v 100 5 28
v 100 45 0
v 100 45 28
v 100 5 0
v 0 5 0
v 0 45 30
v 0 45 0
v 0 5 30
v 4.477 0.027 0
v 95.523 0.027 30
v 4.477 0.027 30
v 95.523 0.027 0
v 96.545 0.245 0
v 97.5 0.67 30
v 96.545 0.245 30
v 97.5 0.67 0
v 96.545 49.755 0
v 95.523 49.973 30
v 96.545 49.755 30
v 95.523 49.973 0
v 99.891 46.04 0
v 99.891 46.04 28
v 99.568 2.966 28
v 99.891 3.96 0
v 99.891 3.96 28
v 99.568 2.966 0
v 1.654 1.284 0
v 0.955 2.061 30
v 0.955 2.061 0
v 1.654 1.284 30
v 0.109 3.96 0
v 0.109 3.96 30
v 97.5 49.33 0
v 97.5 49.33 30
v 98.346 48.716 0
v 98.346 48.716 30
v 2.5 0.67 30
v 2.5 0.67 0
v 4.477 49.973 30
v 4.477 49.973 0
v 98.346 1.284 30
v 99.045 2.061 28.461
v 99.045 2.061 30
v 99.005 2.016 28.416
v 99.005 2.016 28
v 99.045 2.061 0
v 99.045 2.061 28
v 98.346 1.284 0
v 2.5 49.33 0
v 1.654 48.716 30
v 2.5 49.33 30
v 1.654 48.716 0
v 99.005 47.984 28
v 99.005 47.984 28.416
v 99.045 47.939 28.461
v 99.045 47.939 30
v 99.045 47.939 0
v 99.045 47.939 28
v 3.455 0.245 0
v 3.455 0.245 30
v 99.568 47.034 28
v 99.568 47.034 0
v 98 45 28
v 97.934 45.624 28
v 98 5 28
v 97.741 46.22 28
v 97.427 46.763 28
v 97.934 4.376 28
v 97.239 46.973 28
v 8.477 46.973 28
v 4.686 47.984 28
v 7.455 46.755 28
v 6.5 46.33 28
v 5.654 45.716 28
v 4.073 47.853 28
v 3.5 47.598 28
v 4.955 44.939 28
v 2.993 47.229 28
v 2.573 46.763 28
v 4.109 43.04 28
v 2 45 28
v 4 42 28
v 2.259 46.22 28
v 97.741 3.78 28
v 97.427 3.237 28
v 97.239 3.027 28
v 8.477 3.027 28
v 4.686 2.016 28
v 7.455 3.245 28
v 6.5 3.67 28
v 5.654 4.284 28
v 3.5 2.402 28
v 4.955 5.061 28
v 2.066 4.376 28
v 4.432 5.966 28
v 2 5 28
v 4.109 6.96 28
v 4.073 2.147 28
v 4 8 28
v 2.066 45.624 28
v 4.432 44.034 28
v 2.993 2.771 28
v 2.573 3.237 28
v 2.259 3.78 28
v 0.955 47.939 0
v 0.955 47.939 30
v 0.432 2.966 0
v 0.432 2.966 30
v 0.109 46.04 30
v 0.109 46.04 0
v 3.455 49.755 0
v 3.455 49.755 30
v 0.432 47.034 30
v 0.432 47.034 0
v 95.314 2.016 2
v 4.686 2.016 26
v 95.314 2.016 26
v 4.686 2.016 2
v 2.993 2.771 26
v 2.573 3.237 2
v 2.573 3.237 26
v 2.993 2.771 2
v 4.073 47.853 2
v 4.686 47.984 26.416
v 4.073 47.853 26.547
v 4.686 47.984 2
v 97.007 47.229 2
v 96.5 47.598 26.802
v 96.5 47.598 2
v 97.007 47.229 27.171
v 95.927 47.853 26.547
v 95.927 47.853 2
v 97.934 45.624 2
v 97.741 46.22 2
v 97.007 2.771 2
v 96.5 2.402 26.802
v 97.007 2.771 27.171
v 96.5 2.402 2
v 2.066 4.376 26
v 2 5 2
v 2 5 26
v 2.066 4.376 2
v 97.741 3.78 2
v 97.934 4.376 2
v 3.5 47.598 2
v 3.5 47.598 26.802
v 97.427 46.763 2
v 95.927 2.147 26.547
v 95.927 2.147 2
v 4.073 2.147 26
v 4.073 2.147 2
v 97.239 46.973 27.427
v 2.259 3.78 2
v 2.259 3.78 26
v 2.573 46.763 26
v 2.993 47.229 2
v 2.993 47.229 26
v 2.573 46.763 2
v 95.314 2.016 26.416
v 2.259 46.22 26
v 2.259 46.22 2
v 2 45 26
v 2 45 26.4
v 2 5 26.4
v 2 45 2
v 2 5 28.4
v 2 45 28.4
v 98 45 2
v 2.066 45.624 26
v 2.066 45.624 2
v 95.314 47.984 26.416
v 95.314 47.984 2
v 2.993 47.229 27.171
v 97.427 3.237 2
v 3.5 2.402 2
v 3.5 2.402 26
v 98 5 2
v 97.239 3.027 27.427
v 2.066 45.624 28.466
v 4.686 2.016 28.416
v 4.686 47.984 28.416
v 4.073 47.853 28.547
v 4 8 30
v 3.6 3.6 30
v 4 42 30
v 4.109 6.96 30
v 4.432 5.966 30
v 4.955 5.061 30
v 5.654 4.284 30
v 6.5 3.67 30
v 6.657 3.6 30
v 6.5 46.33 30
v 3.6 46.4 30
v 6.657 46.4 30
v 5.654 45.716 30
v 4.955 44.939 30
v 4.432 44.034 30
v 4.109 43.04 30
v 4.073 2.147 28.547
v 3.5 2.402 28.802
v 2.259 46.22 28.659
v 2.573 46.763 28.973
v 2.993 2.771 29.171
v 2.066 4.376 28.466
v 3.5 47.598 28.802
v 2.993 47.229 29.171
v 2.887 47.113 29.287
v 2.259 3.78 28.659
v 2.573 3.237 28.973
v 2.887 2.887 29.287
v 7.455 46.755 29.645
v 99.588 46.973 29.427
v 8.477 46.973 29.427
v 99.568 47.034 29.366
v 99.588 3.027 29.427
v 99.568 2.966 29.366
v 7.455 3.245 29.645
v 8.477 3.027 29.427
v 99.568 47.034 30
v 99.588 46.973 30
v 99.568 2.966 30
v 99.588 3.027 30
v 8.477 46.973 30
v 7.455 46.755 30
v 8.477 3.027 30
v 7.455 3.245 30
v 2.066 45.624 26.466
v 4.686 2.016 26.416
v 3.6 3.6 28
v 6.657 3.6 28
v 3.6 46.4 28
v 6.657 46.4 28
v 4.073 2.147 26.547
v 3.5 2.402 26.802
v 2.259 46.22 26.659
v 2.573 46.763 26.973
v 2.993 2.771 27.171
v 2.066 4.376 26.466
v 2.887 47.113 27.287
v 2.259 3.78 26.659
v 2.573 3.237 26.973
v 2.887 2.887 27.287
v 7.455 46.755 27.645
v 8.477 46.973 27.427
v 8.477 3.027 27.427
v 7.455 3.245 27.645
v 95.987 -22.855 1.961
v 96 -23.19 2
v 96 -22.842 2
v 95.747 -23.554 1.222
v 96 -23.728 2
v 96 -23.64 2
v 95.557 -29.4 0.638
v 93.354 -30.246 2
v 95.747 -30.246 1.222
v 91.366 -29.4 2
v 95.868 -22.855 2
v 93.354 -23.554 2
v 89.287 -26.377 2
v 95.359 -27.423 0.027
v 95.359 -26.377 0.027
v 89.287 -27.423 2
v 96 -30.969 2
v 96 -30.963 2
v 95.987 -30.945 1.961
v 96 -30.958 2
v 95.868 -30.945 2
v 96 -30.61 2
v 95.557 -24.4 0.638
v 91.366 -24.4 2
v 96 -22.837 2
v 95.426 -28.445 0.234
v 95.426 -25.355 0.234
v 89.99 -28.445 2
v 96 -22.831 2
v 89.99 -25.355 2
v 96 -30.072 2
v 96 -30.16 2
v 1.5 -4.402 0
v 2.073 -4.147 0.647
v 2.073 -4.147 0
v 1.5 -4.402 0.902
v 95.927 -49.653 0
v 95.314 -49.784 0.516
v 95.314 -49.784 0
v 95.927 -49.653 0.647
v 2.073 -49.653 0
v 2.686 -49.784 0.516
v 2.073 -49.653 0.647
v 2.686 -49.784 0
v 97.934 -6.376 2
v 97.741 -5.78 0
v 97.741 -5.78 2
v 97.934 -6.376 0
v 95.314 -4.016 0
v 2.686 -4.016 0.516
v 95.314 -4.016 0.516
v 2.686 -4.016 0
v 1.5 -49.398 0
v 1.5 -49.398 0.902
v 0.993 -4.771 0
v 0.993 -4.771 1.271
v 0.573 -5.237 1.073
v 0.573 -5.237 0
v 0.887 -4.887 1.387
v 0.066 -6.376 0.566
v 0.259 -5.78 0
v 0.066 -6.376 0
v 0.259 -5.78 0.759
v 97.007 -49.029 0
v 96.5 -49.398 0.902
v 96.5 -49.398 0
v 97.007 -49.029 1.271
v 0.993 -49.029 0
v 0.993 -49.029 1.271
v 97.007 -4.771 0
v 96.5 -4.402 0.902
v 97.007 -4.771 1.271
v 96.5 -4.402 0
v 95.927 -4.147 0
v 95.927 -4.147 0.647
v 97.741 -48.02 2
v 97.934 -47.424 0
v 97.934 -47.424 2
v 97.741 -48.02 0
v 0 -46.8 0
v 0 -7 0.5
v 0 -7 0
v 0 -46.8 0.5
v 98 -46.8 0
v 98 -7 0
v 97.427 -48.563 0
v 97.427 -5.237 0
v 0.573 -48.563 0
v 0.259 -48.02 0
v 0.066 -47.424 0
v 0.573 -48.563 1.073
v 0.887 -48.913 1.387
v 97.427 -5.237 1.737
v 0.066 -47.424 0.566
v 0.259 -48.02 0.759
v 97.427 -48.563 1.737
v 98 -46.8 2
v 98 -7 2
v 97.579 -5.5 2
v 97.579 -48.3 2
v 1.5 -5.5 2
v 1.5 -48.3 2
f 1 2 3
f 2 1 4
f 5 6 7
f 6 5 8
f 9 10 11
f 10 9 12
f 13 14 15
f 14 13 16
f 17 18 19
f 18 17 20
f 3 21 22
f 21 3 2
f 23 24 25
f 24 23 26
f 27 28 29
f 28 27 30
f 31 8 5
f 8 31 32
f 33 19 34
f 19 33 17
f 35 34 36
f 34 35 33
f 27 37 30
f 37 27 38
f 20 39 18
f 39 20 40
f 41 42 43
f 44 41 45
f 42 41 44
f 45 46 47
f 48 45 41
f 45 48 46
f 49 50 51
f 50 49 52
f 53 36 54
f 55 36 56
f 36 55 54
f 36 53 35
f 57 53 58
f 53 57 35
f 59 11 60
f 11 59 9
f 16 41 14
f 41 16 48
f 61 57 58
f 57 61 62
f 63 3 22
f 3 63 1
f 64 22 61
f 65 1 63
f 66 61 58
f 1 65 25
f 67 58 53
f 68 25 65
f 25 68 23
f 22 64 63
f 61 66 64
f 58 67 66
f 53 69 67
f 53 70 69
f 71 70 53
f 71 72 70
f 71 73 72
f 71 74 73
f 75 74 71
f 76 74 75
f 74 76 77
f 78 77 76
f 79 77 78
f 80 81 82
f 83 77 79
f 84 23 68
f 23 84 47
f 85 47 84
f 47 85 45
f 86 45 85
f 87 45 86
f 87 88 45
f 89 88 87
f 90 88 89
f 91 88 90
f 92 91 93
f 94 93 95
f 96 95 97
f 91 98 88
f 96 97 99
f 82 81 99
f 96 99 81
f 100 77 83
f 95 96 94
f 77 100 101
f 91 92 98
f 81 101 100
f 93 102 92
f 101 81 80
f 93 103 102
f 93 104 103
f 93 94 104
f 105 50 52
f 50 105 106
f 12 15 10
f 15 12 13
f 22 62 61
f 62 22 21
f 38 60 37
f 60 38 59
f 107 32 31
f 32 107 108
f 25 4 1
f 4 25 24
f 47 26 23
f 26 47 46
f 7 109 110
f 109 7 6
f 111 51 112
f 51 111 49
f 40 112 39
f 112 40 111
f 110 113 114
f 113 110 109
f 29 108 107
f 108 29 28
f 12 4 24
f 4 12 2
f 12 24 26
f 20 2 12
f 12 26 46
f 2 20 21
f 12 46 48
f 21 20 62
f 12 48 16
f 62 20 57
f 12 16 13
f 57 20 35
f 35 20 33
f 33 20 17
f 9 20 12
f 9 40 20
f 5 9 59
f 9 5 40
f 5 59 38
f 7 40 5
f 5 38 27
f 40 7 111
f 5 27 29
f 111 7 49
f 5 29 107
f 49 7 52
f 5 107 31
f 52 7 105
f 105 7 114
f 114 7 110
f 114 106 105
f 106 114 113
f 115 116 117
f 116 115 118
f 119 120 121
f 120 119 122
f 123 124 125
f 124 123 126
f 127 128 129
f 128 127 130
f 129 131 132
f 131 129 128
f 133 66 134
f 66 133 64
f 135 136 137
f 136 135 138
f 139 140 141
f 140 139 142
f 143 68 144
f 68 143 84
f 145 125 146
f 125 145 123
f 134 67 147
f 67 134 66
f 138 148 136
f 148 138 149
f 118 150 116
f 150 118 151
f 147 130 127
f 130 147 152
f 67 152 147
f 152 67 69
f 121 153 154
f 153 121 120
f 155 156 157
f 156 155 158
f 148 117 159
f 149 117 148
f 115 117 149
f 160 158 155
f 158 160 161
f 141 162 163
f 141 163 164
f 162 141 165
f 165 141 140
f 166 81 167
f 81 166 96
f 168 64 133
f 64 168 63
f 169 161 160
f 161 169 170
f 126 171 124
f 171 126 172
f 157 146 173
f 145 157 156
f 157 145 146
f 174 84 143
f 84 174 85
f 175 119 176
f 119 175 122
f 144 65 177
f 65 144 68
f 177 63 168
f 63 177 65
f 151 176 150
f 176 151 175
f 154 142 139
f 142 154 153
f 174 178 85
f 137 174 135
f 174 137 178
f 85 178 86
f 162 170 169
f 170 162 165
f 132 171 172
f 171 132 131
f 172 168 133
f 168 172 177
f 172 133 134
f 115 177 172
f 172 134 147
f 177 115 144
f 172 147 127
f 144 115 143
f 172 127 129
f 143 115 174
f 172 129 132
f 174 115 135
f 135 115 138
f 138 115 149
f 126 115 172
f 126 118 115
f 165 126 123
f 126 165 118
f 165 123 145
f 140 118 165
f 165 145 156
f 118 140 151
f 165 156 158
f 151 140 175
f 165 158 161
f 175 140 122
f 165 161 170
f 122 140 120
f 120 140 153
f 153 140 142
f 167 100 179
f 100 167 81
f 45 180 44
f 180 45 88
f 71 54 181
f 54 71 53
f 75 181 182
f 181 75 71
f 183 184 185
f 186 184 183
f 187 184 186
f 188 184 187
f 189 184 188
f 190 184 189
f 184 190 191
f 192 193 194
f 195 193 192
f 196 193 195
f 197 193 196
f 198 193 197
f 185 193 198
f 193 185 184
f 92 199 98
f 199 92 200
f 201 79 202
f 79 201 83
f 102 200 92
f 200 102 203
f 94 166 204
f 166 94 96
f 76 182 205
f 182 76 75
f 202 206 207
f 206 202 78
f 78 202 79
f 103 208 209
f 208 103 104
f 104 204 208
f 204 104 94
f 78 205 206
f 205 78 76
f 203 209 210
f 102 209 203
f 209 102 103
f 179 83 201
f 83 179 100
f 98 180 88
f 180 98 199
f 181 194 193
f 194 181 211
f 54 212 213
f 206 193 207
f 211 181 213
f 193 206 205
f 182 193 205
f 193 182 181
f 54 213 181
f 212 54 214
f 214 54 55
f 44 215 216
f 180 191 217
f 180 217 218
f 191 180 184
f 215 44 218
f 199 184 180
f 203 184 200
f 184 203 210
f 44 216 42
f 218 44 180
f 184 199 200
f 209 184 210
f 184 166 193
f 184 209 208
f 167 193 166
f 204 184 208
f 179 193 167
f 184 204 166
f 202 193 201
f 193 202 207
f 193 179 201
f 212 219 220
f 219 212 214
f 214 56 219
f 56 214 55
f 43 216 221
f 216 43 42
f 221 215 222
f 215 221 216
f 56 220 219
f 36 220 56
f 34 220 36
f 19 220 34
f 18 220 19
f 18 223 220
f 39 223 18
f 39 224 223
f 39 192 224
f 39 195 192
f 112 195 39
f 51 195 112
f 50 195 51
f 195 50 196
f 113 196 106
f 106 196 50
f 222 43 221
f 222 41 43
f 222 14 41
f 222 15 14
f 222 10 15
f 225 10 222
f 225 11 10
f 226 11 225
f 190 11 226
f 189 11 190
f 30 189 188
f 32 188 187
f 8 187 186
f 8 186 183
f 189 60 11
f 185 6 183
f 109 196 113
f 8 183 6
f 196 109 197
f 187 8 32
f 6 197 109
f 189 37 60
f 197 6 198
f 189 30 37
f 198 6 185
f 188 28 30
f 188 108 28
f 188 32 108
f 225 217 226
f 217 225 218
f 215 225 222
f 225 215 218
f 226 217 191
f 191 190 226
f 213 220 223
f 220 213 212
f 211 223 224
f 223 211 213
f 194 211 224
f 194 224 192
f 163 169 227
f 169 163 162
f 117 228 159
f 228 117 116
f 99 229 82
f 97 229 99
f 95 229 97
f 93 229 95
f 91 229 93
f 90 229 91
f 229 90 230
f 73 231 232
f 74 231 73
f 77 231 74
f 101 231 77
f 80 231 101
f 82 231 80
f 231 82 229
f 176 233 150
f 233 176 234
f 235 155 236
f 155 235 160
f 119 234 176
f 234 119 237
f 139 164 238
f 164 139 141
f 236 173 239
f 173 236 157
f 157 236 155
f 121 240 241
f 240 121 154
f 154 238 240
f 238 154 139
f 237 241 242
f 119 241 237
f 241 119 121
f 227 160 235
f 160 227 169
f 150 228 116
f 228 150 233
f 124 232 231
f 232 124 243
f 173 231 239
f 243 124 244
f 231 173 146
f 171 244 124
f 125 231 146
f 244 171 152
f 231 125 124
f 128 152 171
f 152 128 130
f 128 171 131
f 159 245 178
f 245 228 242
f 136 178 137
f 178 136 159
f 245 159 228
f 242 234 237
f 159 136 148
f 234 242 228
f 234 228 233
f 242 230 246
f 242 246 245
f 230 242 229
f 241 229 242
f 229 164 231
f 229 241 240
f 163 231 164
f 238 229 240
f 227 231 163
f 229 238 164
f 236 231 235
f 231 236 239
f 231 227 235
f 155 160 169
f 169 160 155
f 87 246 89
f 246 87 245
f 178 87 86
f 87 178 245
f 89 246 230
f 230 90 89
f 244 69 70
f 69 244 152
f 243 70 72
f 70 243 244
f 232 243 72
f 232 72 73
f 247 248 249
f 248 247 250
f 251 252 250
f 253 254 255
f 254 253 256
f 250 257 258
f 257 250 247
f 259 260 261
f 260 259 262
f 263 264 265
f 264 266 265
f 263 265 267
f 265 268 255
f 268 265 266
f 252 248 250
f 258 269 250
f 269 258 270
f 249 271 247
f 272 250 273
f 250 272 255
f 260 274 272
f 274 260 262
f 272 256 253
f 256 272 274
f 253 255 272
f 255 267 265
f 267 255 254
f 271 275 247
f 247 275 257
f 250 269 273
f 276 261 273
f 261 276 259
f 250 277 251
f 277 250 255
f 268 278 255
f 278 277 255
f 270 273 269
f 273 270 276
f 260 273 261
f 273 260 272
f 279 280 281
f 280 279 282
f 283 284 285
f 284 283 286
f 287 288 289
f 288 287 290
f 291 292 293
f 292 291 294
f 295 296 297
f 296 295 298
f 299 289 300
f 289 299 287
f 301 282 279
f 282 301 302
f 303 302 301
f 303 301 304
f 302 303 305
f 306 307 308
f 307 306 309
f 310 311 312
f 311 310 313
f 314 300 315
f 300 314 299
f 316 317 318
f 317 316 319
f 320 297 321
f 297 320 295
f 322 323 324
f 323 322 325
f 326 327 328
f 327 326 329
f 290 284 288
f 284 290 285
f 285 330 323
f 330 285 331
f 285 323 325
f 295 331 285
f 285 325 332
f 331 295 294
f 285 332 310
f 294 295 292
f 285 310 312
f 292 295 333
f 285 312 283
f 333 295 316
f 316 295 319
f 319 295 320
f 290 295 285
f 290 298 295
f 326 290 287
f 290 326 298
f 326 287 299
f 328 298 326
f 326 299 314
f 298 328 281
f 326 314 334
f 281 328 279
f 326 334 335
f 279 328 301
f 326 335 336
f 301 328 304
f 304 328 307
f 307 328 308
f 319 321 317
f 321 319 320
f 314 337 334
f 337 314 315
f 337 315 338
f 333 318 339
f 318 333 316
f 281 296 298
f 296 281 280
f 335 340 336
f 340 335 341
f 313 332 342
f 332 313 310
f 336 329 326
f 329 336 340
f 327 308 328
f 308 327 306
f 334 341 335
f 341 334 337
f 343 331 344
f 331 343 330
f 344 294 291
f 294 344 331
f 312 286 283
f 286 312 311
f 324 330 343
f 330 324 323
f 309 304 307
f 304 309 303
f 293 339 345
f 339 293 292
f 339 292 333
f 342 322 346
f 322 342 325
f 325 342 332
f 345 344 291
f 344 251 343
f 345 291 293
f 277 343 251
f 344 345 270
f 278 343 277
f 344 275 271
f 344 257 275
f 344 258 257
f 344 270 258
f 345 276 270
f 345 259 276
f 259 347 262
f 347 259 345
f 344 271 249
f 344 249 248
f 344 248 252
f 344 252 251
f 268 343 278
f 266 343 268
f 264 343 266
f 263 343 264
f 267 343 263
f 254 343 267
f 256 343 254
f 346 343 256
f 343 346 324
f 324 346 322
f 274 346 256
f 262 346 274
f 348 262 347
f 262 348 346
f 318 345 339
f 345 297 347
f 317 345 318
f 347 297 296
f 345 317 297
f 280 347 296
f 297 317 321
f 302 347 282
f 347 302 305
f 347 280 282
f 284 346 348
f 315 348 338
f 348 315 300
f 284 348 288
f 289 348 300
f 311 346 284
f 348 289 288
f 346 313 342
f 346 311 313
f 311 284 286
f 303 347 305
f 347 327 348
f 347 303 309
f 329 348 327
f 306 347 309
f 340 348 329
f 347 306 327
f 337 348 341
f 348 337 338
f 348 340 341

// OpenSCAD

itemsShown="both"; // [both,box,lid]
boxLength=100;
boxWidth=50;
boxHeight=30;
cornerRadius=5;
wallThickness=2;
bottomThickness=2;
lidThickness=2;
lidClearance=0.2;
lidEdgeThickness=0.5;
// Notch in the lid
withNotch=true;//true;//[true:false]

/* [Global] */
if (itemsShown=="box") showBox();
if (itemsShown=="lid") showLid();
if (itemsShown=="both"){showBox();showLid();}

module showLid(){
	translate ([0, -2*wallThickness, 0]) 
	roundBoxLid(l=boxLength-wallThickness,
				w=boxWidth-2*wallThickness-lidClearance,
				h=lidThickness,
				et=lidEdgeThickness,
				r=cornerRadius-wallThickness,
				notch=withNotch);
}

module showBox(){
	round_box(l=boxLength,
			  w=boxWidth,
			  h=boxHeight,
			  bt=bottomThickness,
			  wt=wallThickness,
			  lt=lidThickness,
			  r=cornerRadius);
}

module round_box(l=40,w=30,h=30,bt=2,wt=2,lt=2,r=5,){
	difference() { 
		round_cube(l=l,w=w,h=h-lt,r=r);
		translate ([wt, wt, bt]) 
		round_cube(l=l-wt*2,w=w-wt*2,h=h,r=r-wt);
	}
	//use two box rims. one to make a slope to support the lid
	roundBoxRim();
	translate ([0, 0, -wt]) roundBoxRim();
}

module roundBoxRim(l=boxLength,
				   w=boxWidth,
				   h=boxHeight,
				   et=lidEdgeThickness,
				   r=cornerRadius,
				   wt=wallThickness,
				   lt=lidThickness){
	difference() { 
		translate ([0, 0, h-lt]) 
		round_cube(l=l,w=w,h=lt,r=r);
		translate ([wt+lt,wt+lt-et*2,h-lt-0.1]) 
		round_cube(l=l*2,w=w-2*(wt+lt)+4*et,h=lt+0.2,r=r-wt+lt);

		//subtract out a lid to make the ledge
		translate ([wt, w-wt, h-lt-0.1])
		roundBoxLid(l=l*2,w=w-2*wt,h=lt+0.1,wt=wt,t=lt,et=0.5,r=r-wt,notch=false);
	}
}

module roundBoxLid(l=40,w=30,h=3,wt=2,t=2,et=0.5,r=5,notch=true){
	translate ([l, 0, 0]) 
	rotate (a = [0, 0, 180]) 
	difference(){
		round_cube(l=l,w=w,h=h,t=t,r=r);

		translate ([-1, 0, et]) rotate (a = [45, 0, 0])  cube (size = [l+2, h*2, h*2]); 
		translate ([-1, w, et]) rotate (a = [45, 0, 0])  cube (size = [l+2, h*2, h*2]); 
		translate ([l, -1, et]) rotate (a = [45, 0, 90]) cube (size = [w+2, h*2, h*2]); 
		if (notch==true){
			translate([2,w/2,h+0.001]) thumbNotch(10/2,72,t);
		}
	}
}

module thumbNotch(
	thumbR=12/2,
	angle=72,
	notchHeight=2){

	size=10*thumbR;

	rotate([0,0,90])
	difference(){
		translate([0,
					(thumbR*sin(angle)-notchHeight)/tan(angle),
					 thumbR*sin(angle)-notchHeight])
		rotate([angle,0,0])
		cylinder(r=thumbR,h=size,$fn=30);

		translate([-size,-size,0])
		cube(size*2);
	}
}

module round_cube(l=40,w=30,h=20,r=5,$fn=30){
	hull(){ 
		translate ([r, r, 0]) cylinder (h = h, r=r);
		translate ([r, w-r, 0]) cylinder (h = h, r=r);
		translate ([l-r,w-r, 0]) cylinder (h = h, r=r);
		translate ([l-r, r, 0]) cylinder (h = h, r=r);
	}
}
